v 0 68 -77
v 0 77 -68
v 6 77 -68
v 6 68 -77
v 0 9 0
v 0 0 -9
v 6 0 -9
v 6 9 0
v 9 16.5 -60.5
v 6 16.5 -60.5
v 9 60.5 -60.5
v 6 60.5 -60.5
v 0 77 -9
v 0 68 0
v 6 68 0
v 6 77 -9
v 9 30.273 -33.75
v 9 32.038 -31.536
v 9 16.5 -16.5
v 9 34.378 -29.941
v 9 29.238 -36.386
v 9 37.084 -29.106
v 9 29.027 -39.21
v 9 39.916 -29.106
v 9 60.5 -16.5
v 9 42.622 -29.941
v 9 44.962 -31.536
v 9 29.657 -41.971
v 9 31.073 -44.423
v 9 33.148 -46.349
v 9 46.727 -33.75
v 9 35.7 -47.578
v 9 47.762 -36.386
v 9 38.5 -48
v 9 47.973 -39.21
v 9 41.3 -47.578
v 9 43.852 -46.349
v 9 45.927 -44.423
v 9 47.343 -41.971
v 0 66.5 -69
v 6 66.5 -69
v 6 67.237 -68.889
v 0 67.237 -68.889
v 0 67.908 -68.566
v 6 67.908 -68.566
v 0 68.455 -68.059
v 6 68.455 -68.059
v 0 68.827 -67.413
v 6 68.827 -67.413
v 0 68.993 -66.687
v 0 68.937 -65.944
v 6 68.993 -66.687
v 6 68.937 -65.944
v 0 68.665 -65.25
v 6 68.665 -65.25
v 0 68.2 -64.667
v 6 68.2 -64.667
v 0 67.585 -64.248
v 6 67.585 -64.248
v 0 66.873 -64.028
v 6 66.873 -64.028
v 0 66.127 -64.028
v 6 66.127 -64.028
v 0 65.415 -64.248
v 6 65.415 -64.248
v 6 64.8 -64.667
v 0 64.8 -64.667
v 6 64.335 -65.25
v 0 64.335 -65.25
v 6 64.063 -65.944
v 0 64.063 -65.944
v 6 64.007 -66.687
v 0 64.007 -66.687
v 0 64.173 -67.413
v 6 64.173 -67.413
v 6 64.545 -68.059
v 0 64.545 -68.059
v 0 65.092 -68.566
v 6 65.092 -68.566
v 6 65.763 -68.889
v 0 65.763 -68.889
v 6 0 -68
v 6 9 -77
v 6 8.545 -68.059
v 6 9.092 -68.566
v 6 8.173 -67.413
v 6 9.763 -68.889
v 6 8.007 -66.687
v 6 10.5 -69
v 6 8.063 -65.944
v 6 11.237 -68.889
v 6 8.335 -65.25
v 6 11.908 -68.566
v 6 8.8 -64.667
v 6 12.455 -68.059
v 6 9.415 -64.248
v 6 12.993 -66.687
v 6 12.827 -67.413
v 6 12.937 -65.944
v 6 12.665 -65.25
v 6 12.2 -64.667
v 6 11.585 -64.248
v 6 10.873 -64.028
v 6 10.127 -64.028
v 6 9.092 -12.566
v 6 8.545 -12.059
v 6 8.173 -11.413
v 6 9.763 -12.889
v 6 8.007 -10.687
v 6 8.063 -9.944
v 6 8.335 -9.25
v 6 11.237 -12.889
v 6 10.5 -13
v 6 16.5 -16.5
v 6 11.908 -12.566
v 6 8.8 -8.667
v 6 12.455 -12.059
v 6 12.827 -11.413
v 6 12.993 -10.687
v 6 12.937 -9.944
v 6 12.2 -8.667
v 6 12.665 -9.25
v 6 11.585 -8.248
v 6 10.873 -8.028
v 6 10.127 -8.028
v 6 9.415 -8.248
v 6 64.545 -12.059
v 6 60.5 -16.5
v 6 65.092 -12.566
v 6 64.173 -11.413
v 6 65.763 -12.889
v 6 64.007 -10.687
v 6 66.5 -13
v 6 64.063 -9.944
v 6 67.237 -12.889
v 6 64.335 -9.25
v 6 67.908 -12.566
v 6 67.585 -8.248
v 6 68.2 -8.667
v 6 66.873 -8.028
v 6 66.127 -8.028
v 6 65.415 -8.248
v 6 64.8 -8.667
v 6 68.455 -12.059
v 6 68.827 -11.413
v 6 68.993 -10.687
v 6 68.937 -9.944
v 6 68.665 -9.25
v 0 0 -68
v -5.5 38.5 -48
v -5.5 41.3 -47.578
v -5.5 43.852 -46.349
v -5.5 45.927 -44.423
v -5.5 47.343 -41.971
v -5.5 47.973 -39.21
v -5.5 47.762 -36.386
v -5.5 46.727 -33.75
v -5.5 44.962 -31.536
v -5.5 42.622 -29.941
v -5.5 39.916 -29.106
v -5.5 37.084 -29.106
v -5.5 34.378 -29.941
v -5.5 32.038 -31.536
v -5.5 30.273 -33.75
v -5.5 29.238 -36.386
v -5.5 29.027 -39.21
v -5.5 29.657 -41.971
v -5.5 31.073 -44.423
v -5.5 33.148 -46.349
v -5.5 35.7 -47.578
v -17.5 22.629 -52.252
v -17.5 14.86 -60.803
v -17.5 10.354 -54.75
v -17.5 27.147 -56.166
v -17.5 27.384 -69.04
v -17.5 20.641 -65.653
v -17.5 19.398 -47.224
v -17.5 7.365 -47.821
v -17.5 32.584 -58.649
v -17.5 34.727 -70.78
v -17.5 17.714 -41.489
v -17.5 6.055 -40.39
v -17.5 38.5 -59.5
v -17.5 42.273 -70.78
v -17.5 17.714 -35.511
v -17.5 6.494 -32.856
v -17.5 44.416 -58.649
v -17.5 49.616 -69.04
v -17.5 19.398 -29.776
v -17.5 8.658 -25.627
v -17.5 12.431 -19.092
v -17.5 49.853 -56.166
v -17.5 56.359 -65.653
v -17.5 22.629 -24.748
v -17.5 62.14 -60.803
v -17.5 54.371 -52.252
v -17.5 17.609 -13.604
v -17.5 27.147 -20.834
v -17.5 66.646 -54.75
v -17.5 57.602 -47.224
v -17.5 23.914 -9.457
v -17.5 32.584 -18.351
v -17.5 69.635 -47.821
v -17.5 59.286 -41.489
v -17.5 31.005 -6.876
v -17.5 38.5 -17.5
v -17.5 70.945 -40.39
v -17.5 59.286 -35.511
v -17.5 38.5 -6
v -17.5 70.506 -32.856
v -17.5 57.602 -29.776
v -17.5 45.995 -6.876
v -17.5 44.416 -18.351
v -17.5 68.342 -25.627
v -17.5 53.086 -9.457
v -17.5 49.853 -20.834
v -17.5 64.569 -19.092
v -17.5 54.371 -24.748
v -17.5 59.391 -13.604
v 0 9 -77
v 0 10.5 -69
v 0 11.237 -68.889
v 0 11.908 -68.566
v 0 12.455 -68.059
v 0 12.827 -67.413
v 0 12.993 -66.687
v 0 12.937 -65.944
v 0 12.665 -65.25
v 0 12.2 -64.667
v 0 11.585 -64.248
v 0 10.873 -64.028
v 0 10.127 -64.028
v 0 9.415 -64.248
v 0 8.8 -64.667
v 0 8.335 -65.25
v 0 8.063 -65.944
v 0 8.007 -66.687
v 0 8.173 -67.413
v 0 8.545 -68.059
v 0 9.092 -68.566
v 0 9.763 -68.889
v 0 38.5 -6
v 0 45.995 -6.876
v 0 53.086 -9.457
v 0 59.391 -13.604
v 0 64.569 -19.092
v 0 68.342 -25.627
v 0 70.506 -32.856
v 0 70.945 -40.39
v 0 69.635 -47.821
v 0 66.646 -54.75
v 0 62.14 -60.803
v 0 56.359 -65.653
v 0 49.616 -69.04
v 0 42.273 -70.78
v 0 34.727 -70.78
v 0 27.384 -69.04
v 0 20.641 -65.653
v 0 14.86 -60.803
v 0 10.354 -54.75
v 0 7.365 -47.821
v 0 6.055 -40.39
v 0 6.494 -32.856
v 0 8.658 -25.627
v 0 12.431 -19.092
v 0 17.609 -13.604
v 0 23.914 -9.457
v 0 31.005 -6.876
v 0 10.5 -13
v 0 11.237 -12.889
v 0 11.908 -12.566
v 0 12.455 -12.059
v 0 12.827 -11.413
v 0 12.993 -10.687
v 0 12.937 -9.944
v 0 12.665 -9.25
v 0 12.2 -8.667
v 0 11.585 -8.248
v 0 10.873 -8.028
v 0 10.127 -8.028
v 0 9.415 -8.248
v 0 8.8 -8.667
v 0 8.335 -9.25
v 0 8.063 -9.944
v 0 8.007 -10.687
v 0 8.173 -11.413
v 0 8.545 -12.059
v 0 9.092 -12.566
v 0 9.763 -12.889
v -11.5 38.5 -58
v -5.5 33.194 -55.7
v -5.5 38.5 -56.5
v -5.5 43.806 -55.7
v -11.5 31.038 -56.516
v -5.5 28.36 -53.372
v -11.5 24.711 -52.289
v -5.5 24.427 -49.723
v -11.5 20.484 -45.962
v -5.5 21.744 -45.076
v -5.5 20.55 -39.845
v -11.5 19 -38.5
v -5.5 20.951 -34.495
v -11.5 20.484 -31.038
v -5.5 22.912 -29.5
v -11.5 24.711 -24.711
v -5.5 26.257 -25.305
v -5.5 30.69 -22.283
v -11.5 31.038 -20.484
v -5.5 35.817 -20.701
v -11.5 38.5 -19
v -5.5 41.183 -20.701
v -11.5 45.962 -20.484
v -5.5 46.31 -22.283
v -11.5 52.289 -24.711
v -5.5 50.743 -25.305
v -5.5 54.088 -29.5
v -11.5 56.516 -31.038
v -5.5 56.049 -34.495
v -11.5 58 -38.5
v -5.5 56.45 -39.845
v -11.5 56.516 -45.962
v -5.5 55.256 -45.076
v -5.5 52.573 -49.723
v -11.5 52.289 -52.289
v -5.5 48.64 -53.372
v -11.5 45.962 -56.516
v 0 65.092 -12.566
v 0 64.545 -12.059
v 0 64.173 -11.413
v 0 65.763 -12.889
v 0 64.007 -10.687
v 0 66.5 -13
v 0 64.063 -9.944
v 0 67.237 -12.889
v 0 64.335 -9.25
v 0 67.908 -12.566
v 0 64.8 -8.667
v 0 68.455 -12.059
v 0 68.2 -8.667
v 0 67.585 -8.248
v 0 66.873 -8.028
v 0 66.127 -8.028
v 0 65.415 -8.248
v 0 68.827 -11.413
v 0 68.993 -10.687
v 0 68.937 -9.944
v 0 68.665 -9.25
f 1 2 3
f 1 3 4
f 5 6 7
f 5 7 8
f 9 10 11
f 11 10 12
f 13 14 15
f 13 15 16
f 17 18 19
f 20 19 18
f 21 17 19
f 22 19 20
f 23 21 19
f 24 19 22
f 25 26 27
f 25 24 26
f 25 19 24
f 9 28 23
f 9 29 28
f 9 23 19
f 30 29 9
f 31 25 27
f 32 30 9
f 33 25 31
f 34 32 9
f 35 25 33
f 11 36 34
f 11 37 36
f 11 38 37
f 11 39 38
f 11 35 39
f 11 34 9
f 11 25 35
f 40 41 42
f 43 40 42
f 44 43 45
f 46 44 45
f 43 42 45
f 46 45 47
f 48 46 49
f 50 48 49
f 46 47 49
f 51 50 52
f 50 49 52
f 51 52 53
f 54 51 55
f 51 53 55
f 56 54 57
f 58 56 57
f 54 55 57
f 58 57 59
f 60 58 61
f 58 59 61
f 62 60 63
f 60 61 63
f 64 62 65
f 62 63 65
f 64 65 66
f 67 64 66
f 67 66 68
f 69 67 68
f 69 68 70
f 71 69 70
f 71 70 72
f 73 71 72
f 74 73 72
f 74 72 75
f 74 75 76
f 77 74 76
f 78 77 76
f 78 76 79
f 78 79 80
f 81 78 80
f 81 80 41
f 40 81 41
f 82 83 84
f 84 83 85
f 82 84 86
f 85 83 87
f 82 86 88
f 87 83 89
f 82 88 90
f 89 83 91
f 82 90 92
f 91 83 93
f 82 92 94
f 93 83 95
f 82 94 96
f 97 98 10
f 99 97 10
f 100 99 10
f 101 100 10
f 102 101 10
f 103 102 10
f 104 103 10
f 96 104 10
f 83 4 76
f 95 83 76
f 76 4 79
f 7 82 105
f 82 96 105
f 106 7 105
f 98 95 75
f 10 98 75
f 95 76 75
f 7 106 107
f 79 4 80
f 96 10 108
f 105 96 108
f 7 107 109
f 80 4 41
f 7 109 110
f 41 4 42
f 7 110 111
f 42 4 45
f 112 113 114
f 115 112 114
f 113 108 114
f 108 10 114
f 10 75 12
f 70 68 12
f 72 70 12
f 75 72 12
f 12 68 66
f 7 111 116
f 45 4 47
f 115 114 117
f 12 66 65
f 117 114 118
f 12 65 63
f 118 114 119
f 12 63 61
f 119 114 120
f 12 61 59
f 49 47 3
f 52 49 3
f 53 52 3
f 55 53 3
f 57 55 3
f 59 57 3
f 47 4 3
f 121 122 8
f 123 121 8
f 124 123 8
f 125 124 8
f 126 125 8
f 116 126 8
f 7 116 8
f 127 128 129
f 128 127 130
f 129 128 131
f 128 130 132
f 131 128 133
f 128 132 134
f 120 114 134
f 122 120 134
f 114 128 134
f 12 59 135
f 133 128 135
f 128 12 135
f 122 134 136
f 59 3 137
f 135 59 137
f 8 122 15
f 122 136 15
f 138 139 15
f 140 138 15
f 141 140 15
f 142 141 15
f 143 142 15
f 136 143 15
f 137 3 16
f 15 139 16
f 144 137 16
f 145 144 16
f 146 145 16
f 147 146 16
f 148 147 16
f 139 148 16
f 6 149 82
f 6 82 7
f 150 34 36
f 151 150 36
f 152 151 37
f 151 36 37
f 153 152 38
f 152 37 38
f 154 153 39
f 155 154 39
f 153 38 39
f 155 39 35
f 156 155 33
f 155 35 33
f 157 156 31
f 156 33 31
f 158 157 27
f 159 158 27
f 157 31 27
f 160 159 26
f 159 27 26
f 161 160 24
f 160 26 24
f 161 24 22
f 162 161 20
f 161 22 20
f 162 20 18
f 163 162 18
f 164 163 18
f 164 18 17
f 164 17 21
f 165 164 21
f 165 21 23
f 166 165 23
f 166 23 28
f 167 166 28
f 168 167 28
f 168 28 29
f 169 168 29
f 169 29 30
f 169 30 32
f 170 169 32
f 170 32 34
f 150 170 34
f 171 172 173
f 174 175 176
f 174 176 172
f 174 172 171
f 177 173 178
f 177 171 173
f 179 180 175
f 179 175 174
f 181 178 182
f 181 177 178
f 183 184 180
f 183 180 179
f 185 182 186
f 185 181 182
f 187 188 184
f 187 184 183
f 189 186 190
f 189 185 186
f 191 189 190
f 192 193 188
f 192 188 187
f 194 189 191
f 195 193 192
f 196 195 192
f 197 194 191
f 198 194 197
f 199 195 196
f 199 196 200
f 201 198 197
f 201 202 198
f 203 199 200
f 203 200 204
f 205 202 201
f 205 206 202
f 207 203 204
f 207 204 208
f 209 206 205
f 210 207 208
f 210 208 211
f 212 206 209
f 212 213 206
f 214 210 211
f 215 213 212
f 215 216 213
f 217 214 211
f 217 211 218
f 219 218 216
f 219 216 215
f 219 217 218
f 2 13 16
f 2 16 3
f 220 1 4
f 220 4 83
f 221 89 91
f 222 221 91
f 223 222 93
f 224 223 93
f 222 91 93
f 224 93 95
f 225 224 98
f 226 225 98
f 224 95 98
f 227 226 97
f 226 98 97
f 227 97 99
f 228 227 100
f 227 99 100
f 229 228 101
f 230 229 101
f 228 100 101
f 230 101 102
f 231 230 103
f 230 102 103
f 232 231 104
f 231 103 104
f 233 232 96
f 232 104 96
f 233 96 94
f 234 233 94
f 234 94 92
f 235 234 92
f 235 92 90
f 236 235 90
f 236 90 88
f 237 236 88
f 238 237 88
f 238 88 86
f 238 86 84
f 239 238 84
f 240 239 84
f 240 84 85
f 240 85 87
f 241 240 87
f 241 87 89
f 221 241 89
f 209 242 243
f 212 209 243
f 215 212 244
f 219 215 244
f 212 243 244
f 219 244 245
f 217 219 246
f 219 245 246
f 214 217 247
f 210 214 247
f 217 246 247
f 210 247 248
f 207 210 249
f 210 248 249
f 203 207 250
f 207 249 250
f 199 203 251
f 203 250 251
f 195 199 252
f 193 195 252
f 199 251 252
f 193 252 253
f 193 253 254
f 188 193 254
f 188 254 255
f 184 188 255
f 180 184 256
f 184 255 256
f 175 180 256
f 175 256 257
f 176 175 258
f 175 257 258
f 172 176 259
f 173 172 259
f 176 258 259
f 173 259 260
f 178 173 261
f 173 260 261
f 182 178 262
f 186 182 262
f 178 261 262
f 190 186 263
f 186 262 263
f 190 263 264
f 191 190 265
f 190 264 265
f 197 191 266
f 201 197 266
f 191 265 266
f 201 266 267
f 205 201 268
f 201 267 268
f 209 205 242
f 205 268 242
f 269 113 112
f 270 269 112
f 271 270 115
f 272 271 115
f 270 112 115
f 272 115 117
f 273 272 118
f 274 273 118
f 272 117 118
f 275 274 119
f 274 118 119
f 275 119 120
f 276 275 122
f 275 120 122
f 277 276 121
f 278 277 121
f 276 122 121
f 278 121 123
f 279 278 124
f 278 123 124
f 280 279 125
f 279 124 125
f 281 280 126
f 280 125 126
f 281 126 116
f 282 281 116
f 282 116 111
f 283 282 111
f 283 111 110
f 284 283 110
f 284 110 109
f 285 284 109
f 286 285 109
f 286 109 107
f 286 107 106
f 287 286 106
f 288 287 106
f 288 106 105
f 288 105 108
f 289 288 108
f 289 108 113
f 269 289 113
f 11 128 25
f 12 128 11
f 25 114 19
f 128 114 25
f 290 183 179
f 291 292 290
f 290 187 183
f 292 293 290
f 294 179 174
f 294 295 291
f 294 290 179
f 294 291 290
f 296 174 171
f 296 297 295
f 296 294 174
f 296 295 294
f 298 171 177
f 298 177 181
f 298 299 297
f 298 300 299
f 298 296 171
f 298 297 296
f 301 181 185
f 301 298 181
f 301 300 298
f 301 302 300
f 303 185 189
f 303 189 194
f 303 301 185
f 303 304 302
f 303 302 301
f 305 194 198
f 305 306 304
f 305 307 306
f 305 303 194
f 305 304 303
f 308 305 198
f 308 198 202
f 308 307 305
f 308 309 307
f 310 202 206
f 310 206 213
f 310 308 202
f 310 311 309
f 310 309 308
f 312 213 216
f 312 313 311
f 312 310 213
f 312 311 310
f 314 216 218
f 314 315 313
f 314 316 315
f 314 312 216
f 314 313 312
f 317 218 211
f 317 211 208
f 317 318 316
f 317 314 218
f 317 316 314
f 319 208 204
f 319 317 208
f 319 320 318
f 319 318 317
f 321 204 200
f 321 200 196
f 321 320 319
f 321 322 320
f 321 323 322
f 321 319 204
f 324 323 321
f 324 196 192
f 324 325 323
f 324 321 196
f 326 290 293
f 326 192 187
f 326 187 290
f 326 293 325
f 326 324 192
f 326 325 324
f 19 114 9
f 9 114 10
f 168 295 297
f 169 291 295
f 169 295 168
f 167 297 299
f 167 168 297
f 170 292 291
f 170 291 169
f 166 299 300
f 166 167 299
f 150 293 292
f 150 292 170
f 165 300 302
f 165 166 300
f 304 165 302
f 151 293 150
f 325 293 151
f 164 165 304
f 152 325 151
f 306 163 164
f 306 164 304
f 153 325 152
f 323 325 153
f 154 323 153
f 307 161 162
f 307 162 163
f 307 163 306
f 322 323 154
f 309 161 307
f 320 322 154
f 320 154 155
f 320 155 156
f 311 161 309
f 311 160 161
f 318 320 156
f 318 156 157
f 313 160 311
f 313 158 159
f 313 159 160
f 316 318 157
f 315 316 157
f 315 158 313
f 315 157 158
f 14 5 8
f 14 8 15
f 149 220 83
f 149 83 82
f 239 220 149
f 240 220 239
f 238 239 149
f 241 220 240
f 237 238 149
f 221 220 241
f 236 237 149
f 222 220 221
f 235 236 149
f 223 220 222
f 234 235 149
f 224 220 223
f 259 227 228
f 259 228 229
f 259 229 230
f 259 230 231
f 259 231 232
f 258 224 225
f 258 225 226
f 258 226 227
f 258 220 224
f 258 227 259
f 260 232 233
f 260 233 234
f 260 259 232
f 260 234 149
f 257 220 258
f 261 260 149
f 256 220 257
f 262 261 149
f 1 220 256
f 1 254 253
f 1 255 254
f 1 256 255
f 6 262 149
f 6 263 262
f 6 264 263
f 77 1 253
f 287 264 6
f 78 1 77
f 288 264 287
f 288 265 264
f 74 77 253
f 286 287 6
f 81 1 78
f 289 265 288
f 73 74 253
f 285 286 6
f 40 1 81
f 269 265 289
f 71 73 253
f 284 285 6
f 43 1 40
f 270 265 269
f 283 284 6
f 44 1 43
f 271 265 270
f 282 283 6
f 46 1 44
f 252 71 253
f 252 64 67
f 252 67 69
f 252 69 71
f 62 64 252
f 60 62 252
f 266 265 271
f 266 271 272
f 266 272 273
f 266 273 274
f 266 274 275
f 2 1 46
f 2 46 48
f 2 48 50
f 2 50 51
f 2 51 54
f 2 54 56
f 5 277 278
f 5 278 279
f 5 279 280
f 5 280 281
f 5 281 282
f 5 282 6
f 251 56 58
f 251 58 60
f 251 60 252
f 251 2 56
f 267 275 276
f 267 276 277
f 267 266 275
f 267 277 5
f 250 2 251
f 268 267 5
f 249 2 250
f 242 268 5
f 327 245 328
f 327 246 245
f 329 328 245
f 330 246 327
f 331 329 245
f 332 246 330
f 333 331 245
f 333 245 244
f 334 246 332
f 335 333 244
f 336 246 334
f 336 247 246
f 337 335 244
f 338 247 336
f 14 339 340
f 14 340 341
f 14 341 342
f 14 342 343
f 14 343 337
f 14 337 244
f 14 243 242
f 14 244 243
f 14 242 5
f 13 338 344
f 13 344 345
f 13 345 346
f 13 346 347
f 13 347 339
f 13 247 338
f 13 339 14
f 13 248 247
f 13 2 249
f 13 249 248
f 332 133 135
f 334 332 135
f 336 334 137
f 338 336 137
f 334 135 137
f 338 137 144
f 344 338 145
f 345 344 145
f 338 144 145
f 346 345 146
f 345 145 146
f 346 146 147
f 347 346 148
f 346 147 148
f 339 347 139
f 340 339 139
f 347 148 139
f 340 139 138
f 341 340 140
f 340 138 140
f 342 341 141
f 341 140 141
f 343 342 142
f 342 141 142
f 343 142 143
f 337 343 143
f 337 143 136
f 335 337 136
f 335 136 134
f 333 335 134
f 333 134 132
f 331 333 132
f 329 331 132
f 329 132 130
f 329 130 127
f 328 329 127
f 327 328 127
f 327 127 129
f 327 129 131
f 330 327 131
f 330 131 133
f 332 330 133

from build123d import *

# Parameters (mm, degrees)
EXTRUDE1_DEPTH            = 6
SKETCH2_W                 = 44
SKETCH2_H                 = 44
EXTRUDE2_DEPTH            = 3
SKETCH4_R                 = 32.5
EXTRUDE3_DEPTH            = 17.5
SKETCH3_R                 = 9.5
EXTRUDE4_DEPTH            = 27.5
SKETCH16_R                = 21
EXTRUDE7_DEPTH            = 12
SKETCH19_R                = 2.5
EXTRUDE8_DEPTH            = 24.5
LPATTERN1_COUNT           = 2
LPATTERN1_PITCH           = 56
LPATTERN2_COUNT           = 2
LPATTERN2_PITCH           = 56
LPATTERN2_COPY_1_SKETCH_R = 2.5
LPATTERN2_COPY_1_DEPTH    = 24.5


with BuildPart() as part:
    # Sketch1 → Extrude1 (new body)
    with BuildSketch(Plane(origin=(0, 0, 0), x_dir=(0, 0, -1), z_dir=(1, 0, 0))):
        Polygon((0, 68), (9, 77), (68, 77), (77, 68), (77, 9), (68, 0), (9, 0), (0, 9), align=None)
    extrude(amount=EXTRUDE1_DEPTH)

    # Sketch2 → Extrude2 (add)
    with BuildSketch(Plane(origin=(6, 0, 0), x_dir=(0, 0, -1), z_dir=(1, 0, 0))):
        with Locations((38.5, 38.5)):
            Rectangle(SKETCH2_W, SKETCH2_H)
    extrude(amount=EXTRUDE2_DEPTH)

    # Sketch4 → Extrude3 (add)
    with BuildSketch(Plane.ZY):
        with Locations((-38.5, 38.5)):
            Circle(SKETCH4_R)
    extrude(amount=EXTRUDE3_DEPTH)

    # Sketch3 → Extrude4 (cut, through all)
    with BuildSketch(Plane(origin=(9, 0, 0), x_dir=(0, 0, -1), z_dir=(1, 0, 0))):
        with Locations((38.5, 38.5)):
            Circle(SKETCH3_R)
    extrude(amount=-EXTRUDE4_DEPTH, mode=Mode.SUBTRACT)

    # Sketch16 → Extrude7 (cut)
    with BuildSketch(Plane.ZY.offset(17.5)):
        with Locations((-38.5, 38.5)):
            Circle(SKETCH16_R)
    extrude(amount=-EXTRUDE7_DEPTH, mode=Mode.SUBTRACT)

    # Sketch18 → Revolve2 (revolve)
    with BuildSketch(Plane.XZ.offset(-38.5)):
        Polygon((-5.5, -56.5), (-5.5, -59.5), (-17.5, -59.5), align=None)
    revolve(axis=Axis((9, 38.5, -38.5), (-1, 0, 0)))

    # Sketch19 → Extrude8 (cut, through all)
    with BuildSketch(Plane(origin=(6, 0, 0), x_dir=(0, 0, -1), z_dir=(1, 0, 0))):
        with Locations((10.5, 66.5)):
            Circle(SKETCH19_R)
    extrude8 = extrude(amount=-EXTRUDE8_DEPTH, mode=Mode.SUBTRACT)

    # LPattern1: Extrude8 ×2
    with Locations(*[(0, 0, -i * LPATTERN1_PITCH) for i in range(1, LPATTERN1_COUNT)]):
        add(extrude8, mode=Mode.SUBTRACT)

    # LPattern2: Extrude8 ×2
    with Locations(*[(0, -i * LPATTERN2_PITCH, 0) for i in range(1, LPATTERN2_COUNT)]):
        add(extrude8, mode=Mode.SUBTRACT)

    # LPattern2 copy 1 sketch → LPattern2 copy 1 (cut, through all)
    with BuildSketch(Plane(origin=(6, -56, -56), x_dir=(0, 0, -1), z_dir=(1, 0, 0))):
        with Locations((10.5, 66.5)):
            Circle(LPATTERN2_COPY_1_SKETCH_R)
    extrude(amount=-LPATTERN2_COPY_1_DEPTH, mode=Mode.SUBTRACT)


solid = part.part
